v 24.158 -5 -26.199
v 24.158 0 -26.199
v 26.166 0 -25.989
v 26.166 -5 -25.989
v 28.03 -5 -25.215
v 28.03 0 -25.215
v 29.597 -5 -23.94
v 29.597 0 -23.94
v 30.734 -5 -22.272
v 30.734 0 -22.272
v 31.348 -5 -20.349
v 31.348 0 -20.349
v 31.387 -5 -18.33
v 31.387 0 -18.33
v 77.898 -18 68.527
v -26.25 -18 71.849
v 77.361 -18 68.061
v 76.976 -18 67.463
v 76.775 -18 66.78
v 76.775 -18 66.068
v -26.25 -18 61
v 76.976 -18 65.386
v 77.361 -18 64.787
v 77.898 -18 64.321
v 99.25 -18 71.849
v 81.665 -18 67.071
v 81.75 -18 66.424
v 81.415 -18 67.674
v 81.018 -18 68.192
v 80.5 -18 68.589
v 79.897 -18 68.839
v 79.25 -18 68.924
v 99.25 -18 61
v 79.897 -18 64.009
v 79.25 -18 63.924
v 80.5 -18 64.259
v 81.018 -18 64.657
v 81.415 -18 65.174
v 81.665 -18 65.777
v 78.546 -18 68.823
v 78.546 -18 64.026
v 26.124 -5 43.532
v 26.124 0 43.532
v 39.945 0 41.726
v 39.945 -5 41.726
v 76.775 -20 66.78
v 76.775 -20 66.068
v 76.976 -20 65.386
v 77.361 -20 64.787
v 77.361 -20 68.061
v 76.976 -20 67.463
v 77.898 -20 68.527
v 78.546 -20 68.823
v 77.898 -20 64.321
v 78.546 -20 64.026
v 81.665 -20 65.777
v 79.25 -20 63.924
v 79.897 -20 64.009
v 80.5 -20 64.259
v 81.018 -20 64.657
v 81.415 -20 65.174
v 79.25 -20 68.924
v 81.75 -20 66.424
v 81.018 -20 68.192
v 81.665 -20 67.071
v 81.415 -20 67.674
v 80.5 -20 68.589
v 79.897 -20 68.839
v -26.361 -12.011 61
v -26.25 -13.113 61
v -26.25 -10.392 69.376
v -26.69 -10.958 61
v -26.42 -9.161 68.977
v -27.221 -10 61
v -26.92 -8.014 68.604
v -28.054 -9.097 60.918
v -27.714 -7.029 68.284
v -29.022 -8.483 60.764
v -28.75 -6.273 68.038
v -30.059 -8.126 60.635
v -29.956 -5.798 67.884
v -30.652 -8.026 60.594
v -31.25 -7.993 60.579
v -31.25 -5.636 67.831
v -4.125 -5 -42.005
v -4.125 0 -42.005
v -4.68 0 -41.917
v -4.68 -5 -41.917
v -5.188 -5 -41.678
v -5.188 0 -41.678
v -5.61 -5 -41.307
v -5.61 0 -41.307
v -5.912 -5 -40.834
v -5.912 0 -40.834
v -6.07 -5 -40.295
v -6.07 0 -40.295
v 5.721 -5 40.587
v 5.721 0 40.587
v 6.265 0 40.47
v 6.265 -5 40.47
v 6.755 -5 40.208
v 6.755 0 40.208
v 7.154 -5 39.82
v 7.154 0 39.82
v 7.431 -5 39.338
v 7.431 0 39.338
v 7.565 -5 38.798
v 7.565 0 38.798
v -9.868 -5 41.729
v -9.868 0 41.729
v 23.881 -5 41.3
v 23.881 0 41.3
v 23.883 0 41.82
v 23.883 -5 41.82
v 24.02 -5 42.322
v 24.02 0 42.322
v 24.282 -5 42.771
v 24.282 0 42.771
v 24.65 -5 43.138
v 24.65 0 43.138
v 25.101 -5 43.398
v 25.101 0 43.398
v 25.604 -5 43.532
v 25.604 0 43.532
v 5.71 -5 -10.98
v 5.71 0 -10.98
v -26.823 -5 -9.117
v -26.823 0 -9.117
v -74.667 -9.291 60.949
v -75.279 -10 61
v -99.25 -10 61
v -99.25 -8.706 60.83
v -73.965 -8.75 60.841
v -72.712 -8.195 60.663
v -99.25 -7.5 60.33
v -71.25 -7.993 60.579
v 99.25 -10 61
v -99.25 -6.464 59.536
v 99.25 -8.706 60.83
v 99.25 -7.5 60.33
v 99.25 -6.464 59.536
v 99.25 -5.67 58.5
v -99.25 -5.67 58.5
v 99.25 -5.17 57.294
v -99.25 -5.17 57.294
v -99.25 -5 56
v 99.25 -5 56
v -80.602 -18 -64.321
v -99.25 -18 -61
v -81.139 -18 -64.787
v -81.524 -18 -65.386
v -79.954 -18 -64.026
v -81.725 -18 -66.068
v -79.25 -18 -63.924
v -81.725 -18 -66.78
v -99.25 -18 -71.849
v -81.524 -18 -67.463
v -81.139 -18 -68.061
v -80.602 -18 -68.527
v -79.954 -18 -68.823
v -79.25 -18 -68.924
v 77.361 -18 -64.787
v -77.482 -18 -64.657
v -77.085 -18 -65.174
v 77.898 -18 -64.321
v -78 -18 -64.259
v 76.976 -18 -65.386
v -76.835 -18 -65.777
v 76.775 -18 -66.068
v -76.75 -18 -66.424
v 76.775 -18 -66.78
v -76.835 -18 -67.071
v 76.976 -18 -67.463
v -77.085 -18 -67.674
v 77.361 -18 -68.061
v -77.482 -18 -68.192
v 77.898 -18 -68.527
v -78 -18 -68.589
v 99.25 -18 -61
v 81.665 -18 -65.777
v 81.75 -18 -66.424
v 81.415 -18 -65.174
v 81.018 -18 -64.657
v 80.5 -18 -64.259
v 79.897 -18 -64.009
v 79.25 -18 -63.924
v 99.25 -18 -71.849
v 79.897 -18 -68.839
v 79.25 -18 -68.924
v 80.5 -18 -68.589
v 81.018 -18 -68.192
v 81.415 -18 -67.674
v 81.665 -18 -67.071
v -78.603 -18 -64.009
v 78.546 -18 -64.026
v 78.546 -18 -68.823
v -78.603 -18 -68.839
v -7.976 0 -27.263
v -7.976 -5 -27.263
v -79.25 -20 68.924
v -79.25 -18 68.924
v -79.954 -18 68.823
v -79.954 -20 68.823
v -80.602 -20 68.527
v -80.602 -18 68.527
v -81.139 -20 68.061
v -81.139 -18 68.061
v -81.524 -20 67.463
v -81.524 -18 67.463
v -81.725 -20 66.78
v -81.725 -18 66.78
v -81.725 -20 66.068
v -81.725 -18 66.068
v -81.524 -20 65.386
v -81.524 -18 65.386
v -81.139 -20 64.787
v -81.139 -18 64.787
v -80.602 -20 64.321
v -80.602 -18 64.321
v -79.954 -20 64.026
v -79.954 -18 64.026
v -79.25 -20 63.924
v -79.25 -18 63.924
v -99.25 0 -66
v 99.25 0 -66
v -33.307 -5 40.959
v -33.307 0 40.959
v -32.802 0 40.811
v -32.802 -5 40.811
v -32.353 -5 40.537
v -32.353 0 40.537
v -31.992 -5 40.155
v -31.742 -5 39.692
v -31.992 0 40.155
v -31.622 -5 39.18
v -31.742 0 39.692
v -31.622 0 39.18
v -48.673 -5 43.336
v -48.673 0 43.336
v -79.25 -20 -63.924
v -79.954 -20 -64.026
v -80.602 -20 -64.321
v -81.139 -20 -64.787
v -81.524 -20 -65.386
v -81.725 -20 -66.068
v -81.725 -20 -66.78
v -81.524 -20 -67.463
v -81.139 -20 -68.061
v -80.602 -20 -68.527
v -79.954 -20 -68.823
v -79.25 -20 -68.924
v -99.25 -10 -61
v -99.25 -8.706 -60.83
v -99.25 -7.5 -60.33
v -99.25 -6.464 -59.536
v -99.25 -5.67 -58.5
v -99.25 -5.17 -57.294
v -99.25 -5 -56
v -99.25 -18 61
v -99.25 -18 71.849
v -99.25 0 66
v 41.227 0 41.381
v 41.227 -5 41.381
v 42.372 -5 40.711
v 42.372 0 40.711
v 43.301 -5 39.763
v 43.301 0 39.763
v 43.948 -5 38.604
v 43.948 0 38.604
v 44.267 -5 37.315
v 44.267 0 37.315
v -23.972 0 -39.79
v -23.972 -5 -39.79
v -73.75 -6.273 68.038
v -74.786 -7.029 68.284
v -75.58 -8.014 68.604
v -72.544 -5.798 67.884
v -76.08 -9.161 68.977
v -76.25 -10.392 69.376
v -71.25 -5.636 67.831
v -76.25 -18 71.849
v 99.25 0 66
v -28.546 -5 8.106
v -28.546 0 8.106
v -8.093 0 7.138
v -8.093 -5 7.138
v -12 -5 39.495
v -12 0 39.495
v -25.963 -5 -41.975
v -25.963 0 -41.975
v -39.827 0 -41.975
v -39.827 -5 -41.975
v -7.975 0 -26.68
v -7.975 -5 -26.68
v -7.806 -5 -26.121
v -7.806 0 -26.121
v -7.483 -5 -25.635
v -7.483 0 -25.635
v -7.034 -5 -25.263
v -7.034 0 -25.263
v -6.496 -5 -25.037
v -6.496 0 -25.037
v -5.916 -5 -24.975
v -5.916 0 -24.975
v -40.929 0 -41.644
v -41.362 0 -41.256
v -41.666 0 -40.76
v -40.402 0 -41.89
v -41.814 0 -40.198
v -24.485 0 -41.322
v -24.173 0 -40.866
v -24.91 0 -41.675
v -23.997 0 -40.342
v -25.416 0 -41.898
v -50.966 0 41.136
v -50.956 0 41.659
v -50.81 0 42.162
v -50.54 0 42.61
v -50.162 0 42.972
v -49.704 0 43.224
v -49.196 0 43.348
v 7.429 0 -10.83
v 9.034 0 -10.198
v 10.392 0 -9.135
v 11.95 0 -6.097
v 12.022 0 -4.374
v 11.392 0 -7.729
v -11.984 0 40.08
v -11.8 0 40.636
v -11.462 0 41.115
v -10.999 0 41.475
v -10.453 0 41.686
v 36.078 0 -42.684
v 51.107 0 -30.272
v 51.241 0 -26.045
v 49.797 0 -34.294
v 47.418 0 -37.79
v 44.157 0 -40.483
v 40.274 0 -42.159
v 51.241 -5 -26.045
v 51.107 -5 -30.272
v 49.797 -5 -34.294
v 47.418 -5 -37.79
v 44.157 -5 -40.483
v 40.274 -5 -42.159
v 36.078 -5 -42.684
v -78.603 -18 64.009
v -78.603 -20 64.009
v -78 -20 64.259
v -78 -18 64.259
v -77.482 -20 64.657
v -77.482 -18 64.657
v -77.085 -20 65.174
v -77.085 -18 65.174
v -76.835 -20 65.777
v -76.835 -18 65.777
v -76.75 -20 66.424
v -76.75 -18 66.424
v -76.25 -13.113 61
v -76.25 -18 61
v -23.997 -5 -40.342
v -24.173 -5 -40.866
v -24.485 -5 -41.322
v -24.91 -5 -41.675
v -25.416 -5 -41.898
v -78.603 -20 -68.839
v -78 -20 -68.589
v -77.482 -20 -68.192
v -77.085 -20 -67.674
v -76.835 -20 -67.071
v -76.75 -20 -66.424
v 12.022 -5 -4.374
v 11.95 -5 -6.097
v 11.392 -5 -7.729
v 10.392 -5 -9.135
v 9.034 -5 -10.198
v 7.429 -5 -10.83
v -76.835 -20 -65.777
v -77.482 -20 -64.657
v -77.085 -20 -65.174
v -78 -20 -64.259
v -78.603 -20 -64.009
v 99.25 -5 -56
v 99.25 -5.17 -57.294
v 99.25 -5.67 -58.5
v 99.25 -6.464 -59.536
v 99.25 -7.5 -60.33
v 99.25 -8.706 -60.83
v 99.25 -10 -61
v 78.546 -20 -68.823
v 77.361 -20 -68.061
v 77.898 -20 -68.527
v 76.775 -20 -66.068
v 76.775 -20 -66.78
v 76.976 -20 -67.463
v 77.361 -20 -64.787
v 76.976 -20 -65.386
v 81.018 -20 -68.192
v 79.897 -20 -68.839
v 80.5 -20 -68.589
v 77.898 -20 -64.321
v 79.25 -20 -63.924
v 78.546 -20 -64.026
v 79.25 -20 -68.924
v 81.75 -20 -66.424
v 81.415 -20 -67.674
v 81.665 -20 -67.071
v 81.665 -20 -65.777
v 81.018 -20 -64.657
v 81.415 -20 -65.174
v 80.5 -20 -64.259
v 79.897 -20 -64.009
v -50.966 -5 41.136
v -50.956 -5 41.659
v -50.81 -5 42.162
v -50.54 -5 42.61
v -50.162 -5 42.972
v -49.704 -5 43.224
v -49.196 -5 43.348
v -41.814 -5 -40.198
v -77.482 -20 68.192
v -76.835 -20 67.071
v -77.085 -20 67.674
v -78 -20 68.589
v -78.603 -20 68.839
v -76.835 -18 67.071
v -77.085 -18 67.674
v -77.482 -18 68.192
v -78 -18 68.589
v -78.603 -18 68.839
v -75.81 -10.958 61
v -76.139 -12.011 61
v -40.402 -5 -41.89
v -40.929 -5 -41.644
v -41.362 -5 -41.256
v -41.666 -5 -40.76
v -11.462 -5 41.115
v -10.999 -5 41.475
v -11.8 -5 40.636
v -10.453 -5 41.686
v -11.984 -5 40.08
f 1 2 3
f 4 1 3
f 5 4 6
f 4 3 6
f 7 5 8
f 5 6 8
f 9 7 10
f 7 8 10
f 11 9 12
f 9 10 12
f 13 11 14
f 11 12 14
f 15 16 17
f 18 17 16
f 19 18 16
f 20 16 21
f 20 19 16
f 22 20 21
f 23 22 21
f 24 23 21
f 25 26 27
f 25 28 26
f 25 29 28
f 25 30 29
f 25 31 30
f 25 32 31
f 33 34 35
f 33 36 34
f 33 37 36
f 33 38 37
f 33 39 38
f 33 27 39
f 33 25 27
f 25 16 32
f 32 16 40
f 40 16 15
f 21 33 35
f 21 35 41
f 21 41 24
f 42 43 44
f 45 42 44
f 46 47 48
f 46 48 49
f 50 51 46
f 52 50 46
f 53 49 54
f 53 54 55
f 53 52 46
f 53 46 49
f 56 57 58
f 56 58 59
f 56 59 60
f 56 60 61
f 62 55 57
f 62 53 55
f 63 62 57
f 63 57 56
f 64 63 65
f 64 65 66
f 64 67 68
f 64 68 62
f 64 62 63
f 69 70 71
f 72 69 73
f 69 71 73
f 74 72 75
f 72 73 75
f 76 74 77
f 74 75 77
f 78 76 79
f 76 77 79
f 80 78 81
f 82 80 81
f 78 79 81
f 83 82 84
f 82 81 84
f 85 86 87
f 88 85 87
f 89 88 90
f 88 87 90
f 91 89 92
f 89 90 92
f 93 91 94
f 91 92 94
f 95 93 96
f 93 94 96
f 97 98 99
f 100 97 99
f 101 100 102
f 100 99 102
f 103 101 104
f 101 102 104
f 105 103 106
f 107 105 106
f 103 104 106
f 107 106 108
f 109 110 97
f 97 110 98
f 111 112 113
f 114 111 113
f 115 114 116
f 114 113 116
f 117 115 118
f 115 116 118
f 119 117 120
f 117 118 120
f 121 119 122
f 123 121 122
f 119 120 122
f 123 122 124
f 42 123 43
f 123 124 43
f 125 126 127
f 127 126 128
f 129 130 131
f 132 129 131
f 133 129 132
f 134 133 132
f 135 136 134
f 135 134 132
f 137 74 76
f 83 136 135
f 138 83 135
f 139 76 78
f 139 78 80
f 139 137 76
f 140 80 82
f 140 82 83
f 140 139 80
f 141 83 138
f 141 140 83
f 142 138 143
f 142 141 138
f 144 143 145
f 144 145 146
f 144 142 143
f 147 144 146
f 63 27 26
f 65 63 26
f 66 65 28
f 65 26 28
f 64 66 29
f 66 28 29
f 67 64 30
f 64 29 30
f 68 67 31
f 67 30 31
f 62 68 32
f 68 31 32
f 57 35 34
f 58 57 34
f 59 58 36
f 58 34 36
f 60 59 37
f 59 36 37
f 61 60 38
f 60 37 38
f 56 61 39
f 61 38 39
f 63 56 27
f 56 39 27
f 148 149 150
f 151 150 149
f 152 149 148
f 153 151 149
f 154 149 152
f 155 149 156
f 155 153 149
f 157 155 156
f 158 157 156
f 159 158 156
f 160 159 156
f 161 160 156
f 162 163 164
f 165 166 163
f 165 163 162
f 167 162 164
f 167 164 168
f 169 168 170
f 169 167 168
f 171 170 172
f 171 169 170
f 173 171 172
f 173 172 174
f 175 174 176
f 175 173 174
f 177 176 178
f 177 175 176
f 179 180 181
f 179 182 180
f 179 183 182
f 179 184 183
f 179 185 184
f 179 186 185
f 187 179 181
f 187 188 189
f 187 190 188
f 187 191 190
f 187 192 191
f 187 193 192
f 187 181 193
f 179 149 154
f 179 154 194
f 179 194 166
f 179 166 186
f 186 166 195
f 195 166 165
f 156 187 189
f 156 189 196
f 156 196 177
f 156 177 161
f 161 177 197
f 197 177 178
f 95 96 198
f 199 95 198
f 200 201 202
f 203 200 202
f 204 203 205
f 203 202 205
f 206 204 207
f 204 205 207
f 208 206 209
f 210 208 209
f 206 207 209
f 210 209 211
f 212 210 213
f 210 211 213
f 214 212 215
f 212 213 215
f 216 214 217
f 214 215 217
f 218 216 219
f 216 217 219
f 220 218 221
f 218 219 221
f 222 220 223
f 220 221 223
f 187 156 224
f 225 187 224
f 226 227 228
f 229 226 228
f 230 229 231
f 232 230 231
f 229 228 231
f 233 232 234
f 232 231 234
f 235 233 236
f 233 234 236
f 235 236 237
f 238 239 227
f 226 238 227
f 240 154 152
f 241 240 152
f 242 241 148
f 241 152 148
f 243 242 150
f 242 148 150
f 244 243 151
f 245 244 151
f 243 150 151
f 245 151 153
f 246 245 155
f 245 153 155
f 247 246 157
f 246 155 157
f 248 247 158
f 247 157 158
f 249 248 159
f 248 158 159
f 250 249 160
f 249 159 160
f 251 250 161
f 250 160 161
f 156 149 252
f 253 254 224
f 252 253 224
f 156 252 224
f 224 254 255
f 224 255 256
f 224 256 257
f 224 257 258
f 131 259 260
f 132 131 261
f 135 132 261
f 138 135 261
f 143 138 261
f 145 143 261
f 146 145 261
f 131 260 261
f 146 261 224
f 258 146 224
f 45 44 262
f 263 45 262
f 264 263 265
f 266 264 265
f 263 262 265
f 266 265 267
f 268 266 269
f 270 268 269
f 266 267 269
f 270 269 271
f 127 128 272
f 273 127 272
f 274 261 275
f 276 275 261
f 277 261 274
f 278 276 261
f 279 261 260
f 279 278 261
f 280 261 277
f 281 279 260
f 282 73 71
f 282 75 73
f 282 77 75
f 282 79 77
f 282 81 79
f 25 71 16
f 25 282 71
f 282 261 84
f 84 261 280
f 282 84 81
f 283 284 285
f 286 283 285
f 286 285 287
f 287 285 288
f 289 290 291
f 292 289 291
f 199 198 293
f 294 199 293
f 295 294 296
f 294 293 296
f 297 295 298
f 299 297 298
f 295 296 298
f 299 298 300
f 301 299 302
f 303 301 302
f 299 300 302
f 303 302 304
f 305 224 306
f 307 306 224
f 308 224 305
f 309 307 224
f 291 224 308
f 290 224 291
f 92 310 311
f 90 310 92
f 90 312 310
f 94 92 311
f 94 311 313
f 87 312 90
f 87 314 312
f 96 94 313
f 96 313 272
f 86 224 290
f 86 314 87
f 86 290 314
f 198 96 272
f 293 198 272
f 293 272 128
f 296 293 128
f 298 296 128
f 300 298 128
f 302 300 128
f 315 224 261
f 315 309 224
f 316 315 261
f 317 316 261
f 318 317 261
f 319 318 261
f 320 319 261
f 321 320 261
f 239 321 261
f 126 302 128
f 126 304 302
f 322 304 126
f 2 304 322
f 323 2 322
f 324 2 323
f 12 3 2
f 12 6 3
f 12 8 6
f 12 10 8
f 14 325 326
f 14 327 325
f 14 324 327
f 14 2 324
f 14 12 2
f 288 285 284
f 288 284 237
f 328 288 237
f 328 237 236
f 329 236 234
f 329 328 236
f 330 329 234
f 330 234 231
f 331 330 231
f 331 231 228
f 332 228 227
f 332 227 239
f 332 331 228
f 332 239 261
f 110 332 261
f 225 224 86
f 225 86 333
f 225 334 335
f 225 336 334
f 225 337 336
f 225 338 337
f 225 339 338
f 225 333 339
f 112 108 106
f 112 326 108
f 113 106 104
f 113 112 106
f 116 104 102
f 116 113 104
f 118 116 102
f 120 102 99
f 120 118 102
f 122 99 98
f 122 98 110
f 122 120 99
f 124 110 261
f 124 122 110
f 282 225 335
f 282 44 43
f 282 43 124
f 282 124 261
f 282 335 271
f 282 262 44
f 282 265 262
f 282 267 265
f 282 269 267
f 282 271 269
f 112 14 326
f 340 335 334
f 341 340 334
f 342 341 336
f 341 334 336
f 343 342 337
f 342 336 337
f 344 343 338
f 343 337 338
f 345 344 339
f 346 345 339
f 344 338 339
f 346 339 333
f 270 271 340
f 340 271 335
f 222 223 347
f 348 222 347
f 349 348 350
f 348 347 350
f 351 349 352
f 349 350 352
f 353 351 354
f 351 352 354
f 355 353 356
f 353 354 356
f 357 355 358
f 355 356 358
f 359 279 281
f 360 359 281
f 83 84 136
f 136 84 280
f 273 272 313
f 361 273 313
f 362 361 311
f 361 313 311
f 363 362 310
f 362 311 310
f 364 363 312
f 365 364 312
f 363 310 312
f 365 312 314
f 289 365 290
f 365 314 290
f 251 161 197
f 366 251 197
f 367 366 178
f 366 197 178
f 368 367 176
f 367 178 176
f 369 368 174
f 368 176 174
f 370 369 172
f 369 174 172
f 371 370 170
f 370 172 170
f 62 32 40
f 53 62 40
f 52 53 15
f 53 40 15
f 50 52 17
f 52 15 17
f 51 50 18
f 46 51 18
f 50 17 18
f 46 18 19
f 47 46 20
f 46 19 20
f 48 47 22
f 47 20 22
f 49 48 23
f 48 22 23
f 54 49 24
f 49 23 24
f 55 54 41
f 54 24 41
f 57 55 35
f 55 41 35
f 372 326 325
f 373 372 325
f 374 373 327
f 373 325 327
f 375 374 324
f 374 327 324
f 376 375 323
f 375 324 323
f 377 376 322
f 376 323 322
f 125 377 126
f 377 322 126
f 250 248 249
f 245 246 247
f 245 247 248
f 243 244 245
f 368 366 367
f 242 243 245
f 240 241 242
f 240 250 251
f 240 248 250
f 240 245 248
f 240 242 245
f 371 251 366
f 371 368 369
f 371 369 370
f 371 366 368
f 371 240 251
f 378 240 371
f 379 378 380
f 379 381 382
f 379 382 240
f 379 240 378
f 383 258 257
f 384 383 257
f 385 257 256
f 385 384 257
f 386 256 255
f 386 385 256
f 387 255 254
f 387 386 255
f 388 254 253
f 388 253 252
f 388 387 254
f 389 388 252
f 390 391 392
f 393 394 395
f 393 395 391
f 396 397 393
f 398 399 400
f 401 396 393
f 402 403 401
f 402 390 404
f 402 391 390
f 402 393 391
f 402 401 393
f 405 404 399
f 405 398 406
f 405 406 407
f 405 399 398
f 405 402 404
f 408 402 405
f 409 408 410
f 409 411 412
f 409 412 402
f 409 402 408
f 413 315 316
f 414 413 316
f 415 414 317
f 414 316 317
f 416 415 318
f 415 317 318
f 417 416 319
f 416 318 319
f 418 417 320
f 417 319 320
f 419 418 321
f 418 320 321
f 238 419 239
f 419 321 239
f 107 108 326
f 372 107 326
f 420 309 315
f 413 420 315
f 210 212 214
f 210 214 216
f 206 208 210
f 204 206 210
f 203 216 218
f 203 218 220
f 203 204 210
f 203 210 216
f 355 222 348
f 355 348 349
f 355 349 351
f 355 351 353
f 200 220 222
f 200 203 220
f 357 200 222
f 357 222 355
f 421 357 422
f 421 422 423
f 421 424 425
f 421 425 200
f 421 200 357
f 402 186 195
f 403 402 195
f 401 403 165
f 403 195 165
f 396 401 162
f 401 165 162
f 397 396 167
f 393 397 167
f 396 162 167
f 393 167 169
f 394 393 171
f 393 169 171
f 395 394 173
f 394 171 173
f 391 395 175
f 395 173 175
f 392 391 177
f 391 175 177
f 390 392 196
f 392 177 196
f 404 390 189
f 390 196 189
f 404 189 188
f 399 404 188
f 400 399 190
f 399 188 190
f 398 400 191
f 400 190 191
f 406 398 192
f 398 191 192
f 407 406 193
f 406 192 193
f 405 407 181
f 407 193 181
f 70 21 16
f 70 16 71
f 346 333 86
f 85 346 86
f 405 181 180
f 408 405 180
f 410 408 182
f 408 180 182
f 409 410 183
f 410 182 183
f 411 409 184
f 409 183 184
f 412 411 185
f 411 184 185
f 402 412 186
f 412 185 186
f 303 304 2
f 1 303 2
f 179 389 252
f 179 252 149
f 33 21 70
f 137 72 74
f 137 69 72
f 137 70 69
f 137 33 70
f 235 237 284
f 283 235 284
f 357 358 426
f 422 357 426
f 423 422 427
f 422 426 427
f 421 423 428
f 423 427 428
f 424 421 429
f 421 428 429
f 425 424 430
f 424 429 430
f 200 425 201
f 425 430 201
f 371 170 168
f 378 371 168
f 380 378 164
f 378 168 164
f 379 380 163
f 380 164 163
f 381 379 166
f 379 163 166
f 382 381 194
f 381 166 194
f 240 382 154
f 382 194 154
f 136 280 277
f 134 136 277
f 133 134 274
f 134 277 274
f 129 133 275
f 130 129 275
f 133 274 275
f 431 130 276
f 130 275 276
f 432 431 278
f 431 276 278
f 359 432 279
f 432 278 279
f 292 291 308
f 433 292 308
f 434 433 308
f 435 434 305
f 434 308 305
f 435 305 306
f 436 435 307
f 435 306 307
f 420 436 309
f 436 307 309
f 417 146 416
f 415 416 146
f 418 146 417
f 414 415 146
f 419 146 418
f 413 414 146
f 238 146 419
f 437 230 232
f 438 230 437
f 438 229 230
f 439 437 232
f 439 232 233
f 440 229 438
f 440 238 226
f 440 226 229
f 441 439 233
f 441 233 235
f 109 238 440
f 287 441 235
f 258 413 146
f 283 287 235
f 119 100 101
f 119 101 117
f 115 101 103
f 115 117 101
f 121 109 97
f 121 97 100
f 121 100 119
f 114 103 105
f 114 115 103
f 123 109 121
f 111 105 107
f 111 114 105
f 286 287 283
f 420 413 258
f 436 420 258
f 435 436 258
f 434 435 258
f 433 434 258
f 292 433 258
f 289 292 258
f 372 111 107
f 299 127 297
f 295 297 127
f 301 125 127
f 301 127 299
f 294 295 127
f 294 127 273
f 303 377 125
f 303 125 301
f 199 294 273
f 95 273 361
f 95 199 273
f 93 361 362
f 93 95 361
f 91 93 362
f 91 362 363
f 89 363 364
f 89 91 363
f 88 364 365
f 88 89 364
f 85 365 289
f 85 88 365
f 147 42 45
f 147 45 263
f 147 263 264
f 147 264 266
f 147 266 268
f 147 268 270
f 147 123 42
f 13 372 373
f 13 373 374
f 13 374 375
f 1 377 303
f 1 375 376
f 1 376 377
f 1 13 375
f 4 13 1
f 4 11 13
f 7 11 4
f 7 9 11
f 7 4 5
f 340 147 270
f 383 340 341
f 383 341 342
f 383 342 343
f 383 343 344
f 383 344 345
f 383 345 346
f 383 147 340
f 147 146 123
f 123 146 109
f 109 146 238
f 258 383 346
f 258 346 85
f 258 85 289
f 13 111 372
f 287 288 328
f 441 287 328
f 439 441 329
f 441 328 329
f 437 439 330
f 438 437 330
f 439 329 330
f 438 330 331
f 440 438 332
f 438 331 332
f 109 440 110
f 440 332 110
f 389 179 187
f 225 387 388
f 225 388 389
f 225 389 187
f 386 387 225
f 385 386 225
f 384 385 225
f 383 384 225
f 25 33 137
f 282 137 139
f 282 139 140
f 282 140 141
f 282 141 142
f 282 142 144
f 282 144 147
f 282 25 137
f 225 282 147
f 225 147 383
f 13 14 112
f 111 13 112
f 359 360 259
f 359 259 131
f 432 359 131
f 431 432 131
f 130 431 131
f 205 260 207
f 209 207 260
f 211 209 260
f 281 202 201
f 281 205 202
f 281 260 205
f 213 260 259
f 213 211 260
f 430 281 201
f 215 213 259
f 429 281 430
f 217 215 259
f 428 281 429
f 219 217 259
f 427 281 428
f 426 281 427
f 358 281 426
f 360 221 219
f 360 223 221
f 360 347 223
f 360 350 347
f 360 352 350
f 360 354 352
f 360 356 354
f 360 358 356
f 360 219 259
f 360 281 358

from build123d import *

# Parameters (mm, degrees)
F1_DEPTH = 99.25
F4_DEPTH = 2
F6_DEPTH = 12
F8_DEPTH = 10


# Not quite as in the source:
# - a feature names something its author has since deleted; it is built from what else it names


with BuildPart() as f1:
    # F0 (on Right) → F1 (new body, symmetric)
    with BuildSketch(Plane.YZ):
        with BuildLine():
            Line((0, 0), (0, 66))
            Line((0, 66), (-18, 71.8485545322))
            Line((-18, 71.8485545322), (-18, 61))
            Line((-18, 61), (-10, 61))
            ThreePointArc((-10, 61), (-6.4644660941, 59.5355339059), (-5, 56))
            Line((-5, 56), (-5, 0))
            Line((-5, 0), (0, 0))
        make_face()
        with BuildLine():
            Line((0, -66), (0, 0))
            Line((0, 0), (-5, 0))
            Line((-5, 0), (-5, -56))
            ThreePointArc((-5, -56), (-6.4644660941, -59.5355339059), (-10, -61))
            Line((-10, -61), (-18, -61))
            Line((-18, -61), (-18, -71.8485545322))
            Line((-18, -71.8485545322), (0, -66))
        make_face()
    extrude(amount=F1_DEPTH, both=True)

    # F3 (on face) + F2 (on face) → F4 (join)
    with BuildSketch(Plane.XZ.offset(18)):
        with BuildLine():
            ThreePointArc((-76.75, -66.4242772661), (-77.482233047, -64.6565103131), (-79.25, -63.9242772661))
            Line((-79.25, -63.9242772661), (-79.25, -68.9242772661))
            ThreePointArc((-79.25, -68.9242772661), (-77.482233047, -68.1920442191), (-76.75, -66.4242772661))
        make_face()
        with BuildLine():
            Line((-79.25, -68.9242772661), (-79.25, -63.9242772661))
            ThreePointArc((-79.25, -63.9242772661), (-81.75, -66.4242772661), (-79.25, -68.9242772661))
        make_face()
        with BuildLine():
            ThreePointArc((81.75, -66.4242772661), (81.017766953, -64.6565103131), (79.25, -63.9242772661))
            Line((79.25, -63.9242772661), (79.25, -68.9242772661))
            ThreePointArc((79.25, -68.9242772661), (81.017766953, -68.1920442191), (81.75, -66.4242772661))
        make_face()
        with BuildLine():
            Line((79.25, -68.9242772661), (79.25, -63.9242772661))
            ThreePointArc((79.25, -63.9242772661), (76.75, -66.4242772661), (79.25, -68.9242772661))
        make_face()
    with BuildSketch(Plane.XZ.offset(18)):
        with BuildLine():
            Line((-79.25, 63.9242772661), (-79.25, 68.9242772661))
            ThreePointArc((-79.25, 68.9242772661), (-81.75, 66.4242772661), (-79.25, 63.9242772661))
        make_face()
        with BuildLine():
            ThreePointArc((-76.75, 66.4242772661), (-77.482233047, 68.1920442191), (-79.25, 68.9242772661))
            Line((-79.25, 68.9242772661), (-79.25, 63.9242772661))
            ThreePointArc((-79.25, 63.9242772661), (-77.482233047, 64.6565103131), (-76.75, 66.4242772661))
        make_face()
        with BuildLine():
            Line((79.25, 63.9242772661), (79.25, 68.9242772661))
            ThreePointArc((79.25, 68.9242772661), (76.75, 66.4242772661), (79.25, 63.9242772661))
        make_face()
        with BuildLine():
            ThreePointArc((81.75, 66.4242772661), (81.017766953, 68.1920442191), (79.25, 68.9242772661))
            Line((79.25, 68.9242772661), (79.25, 63.9242772661))
            ThreePointArc((79.25, 63.9242772661), (81.017766953, 64.6565103131), (81.75, 66.4242772661))
        make_face()
    extrude(amount=F4_DEPTH)

    # F5 (on face) → F6 (cut)
    with BuildSketch(Plane(origin=(0, 19.3969133257, 59.6975608144), x_dir=(1, 0, 0), z_dir=(0, 0.3090169944, 0.9510565163))):
        with BuildLine():
            Line((-31.25, -26.321441665), (-71.25, -26.321441665))
            ThreePointArc((-71.25, -26.321441665), (-74.7855339059, -27.7859077591), (-76.25, -31.321441665))
            Line((-76.25, -31.321441665), (-76.25, -39.321441665))
            Line((-76.25, -39.321441665), (-26.25, -39.321441665))
            Line((-26.25, -39.321441665), (-26.25, -31.321441665))
            ThreePointArc((-26.25, -31.321441665), (-27.7144660941, -27.7859077591), (-31.25, -26.321441665))
        make_face()
    extrude(amount=-F6_DEPTH, mode=Mode.SUBTRACT)

    # F7 (on face) → F8 (cut)
    with BuildSketch(Plane(origin=(0, 0, 0), x_dir=(-1, 0, 0), z_dir=(0, 1, 0))):
        with BuildLine():
            Line((-26.1241253117, 43.5324917753), (-39.945202857, 41.7259457748))
            ThreePointArc((-39.945202857, 41.7259457748), (-42.868486138, 40.2675021288), (-44.2671531873, 37.3151516253))
            Line((-44.2671531873, 37.3151516253), (-51.2410791047, -26.0453891719))
            ThreePointArc((-51.2410791047, -26.0453891719), (-47.4179750613, -37.7900376772), (-36.0778427088, -42.6843498113))
            Line((-36.0778427088, -42.6843498113), (4.1248849593, -42.0054160058))
            ThreePointArc((4.1248849593, -42.0054160058), (5.4117305762, -41.5076906746), (6.0700611664, -40.2951301685))
            Line((6.0700611664, -40.2951301685), (7.9760571648, -27.2630410602))
            ThreePointArc((7.9760571648, -27.2630410602), (7.4832995732, -25.6352393882), (5.915823381, -24.9752646049))
            Line((5.915823381, -24.9752646049), (-24.1576078612, -26.198563135))
            ThreePointArc((-24.1576078612, -26.198563135), (-29.5966863815, -23.9404174945), (-31.3872943296, -18.3300235635))
            Line((-31.3872943296, -18.3300235635), (-23.8805734625, 41.2995541596))
            ThreePointArc((-23.8805734625, 41.2995541596), (-24.45405494, 42.9669237235), (-26.1241253117, 43.5324917753))
        make_face()
        with BuildLine():
            ThreePointArc((-5.7212161103, 40.5873727881), (-6.9681438523, 40.0278262586), (-7.5645672745, 38.7981107574))
            Line((-7.5645672745, 38.7981107574), (-12.0217983934, -4.3736584849))
            ThreePointArc((-12.0217983934, -4.3736584849), (-10.3919235454, -9.1345167822), (-5.7104341995, -10.9800305997))
            Line((-5.7104341995, -10.9800305997), (26.823213324, -9.1166598722))
            Line((26.823213324, -9.1166598722), (23.9718645269, -39.7895195484))
            ThreePointArc((23.9718645269, -39.7895195484), (24.4850628135, -41.3218155235), (25.9632785739, -41.9746413827))
            Line((25.9632785739, -41.9746413827), (39.8267463101, -41.9746413827))
            ThreePointArc((39.8267463101, -41.9746413827), (41.1595537584, -41.4658235666), (41.8142050316, -40.1982656883))
            Line((41.8142050316, -40.1982656883), (50.9657841779, 41.1363000735))
            ThreePointArc((50.9657841779, 41.1363000735), (50.3629399127, 42.8031301188), (48.6725697432, 43.3364145622))
            Line((48.6725697432, 43.3364145622), (33.3066192392, 40.9593589134))
            ThreePointArc((33.3066192392, 40.9593589134), (32.1599535015, 40.357813067), (31.6221064236, 39.1799250248))
            Line((31.6221064236, 39.1799250248), (28.5455137491, 8.1063397229))
            Line((28.5455137491, 8.1063397229), (8.093200624, 7.1375463158))
            Line((8.093200624, 7.1375463158), (12.000094254, 39.4946401574))
            ThreePointArc((12.000094254, 39.4946401574), (11.4616105973, 41.1149341717), (9.8684416836, 41.7290434075))
            Line((9.8684416836, 41.7290434075), (-5.7212161103, 40.5873727881))
        make_face()
    extrude(amount=-F8_DEPTH, mode=Mode.SUBTRACT)


solid = f1.part
